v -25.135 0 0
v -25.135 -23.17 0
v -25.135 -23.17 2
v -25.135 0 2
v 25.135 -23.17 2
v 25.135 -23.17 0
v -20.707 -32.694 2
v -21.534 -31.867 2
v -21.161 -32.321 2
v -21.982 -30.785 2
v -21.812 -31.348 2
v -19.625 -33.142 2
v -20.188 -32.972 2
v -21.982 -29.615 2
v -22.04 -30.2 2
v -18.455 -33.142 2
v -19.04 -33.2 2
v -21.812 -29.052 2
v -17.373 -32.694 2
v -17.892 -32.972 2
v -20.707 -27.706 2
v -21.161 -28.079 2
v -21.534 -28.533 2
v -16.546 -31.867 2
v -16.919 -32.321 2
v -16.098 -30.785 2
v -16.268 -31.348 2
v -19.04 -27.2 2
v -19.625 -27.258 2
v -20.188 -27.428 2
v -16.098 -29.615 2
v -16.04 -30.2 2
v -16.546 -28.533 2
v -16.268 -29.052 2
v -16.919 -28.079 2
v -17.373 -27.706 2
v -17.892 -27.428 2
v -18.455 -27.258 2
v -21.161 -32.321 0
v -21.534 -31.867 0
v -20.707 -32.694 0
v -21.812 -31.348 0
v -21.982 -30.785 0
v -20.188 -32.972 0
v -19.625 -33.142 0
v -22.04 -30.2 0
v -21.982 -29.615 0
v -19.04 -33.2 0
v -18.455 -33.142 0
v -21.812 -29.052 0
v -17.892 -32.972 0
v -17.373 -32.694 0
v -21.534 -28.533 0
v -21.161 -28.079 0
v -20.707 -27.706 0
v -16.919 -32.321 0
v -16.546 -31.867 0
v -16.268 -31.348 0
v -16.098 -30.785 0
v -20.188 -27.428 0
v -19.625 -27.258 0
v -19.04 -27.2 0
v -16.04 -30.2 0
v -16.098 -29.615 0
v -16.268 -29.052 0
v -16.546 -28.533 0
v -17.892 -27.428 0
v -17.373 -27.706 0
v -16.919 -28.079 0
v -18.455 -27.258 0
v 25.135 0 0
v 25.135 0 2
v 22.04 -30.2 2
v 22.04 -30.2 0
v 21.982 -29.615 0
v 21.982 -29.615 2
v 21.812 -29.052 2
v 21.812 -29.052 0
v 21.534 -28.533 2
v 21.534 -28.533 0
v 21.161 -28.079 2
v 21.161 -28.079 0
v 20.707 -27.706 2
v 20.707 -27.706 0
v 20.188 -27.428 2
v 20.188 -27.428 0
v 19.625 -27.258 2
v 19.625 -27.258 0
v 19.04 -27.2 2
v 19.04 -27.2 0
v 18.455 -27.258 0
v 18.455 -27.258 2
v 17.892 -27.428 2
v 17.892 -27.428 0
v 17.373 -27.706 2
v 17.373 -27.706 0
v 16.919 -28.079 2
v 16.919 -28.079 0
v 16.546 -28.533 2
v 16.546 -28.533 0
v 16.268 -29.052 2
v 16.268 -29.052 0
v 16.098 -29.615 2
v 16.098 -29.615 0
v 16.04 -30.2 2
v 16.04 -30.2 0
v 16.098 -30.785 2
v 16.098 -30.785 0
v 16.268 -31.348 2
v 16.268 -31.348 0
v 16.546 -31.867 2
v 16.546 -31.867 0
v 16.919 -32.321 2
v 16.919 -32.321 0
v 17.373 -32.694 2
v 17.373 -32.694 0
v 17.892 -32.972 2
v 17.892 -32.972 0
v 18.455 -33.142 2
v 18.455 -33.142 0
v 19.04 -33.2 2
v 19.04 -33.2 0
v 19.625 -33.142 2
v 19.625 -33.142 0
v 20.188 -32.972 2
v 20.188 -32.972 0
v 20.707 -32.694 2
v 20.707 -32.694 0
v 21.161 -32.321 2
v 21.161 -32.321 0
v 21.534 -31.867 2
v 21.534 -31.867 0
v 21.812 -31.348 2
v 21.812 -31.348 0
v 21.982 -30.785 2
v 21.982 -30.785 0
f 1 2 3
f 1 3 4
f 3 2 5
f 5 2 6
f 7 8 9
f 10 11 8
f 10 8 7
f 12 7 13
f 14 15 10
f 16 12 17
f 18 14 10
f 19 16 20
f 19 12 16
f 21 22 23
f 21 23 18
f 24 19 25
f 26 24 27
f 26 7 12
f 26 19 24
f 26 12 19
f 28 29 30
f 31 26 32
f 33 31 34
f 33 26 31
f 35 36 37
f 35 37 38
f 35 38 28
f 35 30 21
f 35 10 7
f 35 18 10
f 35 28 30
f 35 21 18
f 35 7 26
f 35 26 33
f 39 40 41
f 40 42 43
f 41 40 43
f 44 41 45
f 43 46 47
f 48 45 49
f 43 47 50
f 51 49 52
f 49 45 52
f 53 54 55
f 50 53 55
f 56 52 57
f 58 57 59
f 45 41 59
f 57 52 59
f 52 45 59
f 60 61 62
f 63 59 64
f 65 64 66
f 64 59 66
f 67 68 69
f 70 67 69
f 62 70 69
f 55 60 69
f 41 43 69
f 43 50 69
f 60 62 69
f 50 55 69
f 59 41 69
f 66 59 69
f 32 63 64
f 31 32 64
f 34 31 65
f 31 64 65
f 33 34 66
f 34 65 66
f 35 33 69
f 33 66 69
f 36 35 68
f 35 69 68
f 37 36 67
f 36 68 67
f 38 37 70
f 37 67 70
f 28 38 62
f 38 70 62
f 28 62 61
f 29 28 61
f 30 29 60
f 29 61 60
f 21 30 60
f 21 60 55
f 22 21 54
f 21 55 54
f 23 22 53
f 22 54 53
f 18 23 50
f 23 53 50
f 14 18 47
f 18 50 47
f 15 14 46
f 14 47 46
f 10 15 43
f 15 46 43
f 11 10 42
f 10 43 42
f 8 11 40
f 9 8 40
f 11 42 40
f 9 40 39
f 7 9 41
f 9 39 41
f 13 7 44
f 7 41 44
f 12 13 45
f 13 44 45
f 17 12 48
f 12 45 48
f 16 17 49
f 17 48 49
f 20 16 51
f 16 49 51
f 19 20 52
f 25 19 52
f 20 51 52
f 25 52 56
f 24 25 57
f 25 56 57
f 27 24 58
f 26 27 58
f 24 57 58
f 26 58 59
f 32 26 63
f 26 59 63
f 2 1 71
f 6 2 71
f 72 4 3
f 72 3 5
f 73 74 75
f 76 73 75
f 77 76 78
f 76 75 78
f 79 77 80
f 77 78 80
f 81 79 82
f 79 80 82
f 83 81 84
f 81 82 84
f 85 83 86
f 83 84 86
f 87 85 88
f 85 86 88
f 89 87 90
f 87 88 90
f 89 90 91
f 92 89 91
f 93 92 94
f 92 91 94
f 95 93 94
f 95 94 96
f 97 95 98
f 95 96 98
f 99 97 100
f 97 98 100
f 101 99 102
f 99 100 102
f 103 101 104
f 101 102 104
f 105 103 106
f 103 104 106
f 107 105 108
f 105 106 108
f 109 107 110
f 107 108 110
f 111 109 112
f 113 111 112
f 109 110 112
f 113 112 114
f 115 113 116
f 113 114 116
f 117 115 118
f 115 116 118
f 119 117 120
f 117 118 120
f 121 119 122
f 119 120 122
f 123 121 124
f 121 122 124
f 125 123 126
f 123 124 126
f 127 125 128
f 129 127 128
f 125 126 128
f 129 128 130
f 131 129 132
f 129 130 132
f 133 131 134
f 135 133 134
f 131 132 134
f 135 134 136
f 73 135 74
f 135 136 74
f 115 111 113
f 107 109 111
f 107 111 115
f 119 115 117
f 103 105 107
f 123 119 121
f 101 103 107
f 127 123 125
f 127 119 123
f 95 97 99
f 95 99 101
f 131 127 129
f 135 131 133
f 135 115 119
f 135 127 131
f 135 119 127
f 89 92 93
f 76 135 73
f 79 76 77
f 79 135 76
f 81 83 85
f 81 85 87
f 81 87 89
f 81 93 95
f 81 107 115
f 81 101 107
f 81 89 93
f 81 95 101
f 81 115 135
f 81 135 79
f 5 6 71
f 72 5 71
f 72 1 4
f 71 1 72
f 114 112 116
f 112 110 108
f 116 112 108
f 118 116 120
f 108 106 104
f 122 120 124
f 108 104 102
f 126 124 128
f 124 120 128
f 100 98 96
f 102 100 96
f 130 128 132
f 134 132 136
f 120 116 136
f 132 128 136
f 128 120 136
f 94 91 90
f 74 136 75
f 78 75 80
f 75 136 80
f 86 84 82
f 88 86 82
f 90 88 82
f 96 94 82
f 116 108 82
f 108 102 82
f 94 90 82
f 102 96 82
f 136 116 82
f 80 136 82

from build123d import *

# Parameters (mm, degrees)
F0_W     = 50.27
F0_H     = 23.17
F0_R     = 3
F1_DEPTH = 2


with BuildPart() as f1:
    # F0 (on Top) → F1 (new body)
    with BuildSketch(Plane.XY):
        with Locations((0, -11.585)):
            Rectangle(F0_W, F0_H)
        with Locations((-19.04, -30.2)):
            Circle(F0_R)
        with Locations((19.04, -30.2)):
            Circle(F0_R)
    extrude(amount=F1_DEPTH)


solid = f1.part
